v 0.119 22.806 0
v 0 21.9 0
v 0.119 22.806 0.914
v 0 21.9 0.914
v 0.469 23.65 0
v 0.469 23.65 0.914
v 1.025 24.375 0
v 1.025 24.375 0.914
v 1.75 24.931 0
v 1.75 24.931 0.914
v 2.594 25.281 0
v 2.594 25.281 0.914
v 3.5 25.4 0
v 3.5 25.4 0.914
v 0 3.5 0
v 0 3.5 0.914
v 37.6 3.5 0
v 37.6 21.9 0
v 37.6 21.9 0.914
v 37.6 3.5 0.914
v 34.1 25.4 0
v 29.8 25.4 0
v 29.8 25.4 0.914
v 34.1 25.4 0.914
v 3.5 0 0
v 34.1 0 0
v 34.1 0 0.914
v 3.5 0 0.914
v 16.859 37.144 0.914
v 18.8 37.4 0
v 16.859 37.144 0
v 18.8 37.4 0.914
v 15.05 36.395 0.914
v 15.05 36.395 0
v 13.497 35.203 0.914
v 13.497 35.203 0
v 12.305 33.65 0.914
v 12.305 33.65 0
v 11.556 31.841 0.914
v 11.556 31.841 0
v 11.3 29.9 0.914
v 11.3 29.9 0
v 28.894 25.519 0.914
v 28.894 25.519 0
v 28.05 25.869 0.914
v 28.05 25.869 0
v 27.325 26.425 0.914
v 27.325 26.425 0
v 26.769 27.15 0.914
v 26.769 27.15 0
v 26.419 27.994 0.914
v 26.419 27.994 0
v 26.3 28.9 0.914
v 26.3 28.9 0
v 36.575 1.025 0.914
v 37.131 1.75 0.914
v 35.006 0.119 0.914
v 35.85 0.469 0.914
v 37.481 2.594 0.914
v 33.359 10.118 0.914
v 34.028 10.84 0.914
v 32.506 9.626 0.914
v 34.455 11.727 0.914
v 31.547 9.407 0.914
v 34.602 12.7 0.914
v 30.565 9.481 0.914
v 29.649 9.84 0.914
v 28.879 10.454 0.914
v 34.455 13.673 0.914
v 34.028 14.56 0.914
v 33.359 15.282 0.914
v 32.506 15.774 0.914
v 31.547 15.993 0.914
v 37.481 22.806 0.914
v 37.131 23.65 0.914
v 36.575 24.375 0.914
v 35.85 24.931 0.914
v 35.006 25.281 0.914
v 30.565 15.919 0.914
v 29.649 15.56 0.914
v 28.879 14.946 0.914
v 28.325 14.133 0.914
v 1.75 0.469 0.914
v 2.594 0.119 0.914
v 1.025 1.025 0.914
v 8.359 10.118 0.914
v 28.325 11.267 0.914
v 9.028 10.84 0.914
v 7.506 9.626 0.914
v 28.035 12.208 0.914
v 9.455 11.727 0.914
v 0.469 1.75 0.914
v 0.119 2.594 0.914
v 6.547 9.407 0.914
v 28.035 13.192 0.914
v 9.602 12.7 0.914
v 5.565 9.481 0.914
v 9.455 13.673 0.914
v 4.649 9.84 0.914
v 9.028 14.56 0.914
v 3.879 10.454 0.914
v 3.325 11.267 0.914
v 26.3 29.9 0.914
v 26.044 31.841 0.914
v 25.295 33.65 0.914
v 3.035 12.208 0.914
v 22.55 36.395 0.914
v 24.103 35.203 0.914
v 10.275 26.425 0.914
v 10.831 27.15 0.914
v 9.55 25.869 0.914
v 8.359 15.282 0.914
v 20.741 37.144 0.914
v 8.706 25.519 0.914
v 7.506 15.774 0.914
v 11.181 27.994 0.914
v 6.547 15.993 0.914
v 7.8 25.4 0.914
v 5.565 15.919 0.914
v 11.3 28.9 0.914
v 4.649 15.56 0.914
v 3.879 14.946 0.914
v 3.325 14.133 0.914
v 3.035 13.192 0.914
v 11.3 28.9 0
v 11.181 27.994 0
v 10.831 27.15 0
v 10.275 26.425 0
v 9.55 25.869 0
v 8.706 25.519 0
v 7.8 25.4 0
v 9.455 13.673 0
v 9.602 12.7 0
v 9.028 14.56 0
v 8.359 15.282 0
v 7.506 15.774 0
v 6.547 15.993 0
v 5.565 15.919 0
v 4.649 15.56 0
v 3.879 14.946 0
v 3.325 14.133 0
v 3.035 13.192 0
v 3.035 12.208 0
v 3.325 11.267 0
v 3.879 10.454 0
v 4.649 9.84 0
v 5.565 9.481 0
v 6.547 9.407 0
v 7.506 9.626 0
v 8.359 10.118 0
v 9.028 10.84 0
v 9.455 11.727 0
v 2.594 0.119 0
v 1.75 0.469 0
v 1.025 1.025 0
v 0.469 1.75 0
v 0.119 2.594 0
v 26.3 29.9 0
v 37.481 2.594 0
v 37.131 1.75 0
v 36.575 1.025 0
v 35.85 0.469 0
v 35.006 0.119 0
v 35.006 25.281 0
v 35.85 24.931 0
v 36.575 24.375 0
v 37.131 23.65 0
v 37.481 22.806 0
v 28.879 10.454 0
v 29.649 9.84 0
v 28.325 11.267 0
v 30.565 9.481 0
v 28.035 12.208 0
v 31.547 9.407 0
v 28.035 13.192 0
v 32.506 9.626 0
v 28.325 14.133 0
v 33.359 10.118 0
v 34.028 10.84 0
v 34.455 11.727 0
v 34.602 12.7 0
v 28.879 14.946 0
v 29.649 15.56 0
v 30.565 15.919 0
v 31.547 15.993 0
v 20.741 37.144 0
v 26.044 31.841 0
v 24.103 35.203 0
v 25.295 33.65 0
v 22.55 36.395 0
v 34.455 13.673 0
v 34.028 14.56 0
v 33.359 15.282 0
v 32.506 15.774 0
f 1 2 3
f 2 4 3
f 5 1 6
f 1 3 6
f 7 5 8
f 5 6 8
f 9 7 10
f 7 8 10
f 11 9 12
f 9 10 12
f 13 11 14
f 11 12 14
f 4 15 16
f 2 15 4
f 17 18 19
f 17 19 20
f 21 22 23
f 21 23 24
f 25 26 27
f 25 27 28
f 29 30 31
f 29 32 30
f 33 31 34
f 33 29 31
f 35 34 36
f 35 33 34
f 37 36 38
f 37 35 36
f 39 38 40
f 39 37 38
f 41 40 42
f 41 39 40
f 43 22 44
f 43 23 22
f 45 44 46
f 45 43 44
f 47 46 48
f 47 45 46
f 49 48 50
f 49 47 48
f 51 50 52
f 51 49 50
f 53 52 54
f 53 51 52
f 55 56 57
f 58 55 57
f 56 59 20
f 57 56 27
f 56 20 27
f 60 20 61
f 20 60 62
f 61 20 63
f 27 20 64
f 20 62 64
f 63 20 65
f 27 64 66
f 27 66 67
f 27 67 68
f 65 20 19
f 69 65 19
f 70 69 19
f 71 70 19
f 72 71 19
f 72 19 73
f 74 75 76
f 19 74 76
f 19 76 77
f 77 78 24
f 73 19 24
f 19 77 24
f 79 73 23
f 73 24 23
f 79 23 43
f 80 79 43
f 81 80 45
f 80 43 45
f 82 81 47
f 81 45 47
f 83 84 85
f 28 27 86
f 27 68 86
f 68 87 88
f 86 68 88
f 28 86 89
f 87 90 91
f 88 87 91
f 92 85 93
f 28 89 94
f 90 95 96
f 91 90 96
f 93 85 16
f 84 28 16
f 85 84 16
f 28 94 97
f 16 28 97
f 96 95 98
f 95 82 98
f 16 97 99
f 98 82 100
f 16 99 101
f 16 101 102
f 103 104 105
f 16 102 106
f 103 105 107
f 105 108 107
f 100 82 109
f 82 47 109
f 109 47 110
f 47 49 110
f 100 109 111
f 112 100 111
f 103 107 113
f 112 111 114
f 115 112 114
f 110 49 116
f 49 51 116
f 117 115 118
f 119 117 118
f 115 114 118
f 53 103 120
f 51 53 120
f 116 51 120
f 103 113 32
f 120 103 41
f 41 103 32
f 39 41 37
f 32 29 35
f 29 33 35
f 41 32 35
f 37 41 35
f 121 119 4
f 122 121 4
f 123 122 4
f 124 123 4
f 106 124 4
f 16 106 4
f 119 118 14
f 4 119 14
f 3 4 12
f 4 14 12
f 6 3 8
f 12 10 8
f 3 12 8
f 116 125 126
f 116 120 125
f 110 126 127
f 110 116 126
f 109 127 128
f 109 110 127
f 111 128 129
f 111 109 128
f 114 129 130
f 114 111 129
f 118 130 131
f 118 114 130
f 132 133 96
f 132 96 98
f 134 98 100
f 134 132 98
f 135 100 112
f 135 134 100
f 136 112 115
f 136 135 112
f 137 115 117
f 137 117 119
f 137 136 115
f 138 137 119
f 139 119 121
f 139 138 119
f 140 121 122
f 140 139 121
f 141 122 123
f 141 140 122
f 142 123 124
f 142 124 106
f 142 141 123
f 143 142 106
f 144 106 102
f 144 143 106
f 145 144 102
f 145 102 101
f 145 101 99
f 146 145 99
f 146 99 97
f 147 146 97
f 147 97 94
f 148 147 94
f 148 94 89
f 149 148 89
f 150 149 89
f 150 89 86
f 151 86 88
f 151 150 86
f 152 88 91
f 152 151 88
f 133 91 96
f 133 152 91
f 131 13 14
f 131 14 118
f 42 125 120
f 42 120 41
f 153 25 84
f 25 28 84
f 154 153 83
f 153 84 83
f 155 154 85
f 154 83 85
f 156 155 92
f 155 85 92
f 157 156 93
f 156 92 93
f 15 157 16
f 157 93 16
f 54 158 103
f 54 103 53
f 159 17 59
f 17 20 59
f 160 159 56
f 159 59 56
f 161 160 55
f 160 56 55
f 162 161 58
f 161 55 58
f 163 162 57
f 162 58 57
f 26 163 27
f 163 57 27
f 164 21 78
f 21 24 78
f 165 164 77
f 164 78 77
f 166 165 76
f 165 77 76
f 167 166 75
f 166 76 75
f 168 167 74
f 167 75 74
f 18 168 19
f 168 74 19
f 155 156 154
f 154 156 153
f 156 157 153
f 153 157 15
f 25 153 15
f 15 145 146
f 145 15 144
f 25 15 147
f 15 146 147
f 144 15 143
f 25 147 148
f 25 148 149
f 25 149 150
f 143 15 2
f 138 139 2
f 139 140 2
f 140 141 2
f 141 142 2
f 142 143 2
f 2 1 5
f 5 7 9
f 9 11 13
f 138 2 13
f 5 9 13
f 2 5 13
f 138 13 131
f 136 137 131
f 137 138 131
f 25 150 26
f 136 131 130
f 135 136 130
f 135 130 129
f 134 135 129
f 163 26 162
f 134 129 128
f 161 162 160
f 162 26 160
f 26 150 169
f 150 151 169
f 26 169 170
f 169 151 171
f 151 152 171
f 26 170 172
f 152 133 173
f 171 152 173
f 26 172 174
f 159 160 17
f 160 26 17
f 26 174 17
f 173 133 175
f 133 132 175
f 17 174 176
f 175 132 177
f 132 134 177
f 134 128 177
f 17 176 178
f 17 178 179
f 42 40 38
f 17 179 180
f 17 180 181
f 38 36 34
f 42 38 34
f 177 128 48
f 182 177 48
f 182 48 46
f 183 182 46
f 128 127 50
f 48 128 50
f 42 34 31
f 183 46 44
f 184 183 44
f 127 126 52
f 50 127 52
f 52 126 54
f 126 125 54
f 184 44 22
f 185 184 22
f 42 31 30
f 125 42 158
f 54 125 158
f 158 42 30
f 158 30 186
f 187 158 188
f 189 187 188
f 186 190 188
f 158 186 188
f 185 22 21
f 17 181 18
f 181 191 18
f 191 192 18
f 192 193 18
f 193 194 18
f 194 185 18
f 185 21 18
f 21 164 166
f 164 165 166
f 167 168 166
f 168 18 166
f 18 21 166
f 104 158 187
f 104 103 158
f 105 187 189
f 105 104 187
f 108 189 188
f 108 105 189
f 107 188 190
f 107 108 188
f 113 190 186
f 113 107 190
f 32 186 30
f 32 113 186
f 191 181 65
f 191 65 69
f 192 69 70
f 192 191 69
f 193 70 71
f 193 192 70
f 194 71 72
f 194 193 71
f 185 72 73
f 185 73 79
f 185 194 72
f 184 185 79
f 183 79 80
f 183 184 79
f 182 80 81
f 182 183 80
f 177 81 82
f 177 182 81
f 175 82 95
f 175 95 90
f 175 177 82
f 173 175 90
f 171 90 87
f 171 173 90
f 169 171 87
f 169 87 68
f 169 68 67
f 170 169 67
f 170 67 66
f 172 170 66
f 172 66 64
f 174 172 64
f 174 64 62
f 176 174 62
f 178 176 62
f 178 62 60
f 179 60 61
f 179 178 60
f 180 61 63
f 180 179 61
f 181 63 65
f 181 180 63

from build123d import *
from OCP.BRepFilletAPI import BRepFilletAPI_MakeFillet

# Parameters (mm, degrees)
SKETCH1_R           = 3.302
SKETCH1_R_2         = 4.5
BOSS_EXTRUDE1_DEPTH = 0.9144
FILLET2_R           = 7.5
FILLET2_R_2         = 3.5


with BuildPart() as part:
    # Sketch1 → Boss-Extrude1 (new body)
    # profile 1 of 2: a face of its own
    with BuildSketch(Plane.XY):
        Polygon((26.3, 25.4), (37.6, 25.4), (37.6, 0), (0, 0), (0, 25.4), (11.3, 25.4), (11.3, 37.4), (26.3, 37.4), align=None)
        with Locations((31.3, 12.7)):
            Circle(SKETCH1_R, mode=Mode.SUBTRACT)
        with Locations((6.3, 12.7)):
            Circle(SKETCH1_R, mode=Mode.SUBTRACT)
        with Locations((18.8, 29.9)):
            Circle(SKETCH1_R_2, mode=Mode.SUBTRACT)
    # profile 2 of 2: a face of its own
    with BuildSketch(Plane.XY):
        with Locations((18.8, 29.9)):
            Circle(SKETCH1_R_2)
    extrude(amount=BOSS_EXTRUDE1_DEPTH)

    # Fillet2
    fillet2_edges_1 = [part.edges().sort_by_distance(p)[0] for p in [
        (11.3, 37.4, 0.4572),
        (26.3, 37.4, 0.4572),
    ]]
    fillet2_edges_2 = [part.edges().sort_by_distance(p)[0] for p in [
        (11.3, 25.4, 0.4572),
        (0, 25.4, 0.4572),
        (0, 0, 0.4572),
        (37.6, 25.4, 0.4572),
        (26.3, 25.4, 0.4572),
        (37.6, 0, 0.4572),
    ]]
    fillet2 = BRepFilletAPI_MakeFillet(part.part.solid().wrapped)
    for e in fillet2_edges_1:
        fillet2.Add(FILLET2_R - 0.0001, e.wrapped)
    for e in fillet2_edges_2:
        fillet2.Add(FILLET2_R_2 - 0.0001, e.wrapped)
    add(Compound.cast(fillet2.Shape()), mode=Mode.REPLACE)  # a hair under: the kernel refuses the full size


solid = part.part
